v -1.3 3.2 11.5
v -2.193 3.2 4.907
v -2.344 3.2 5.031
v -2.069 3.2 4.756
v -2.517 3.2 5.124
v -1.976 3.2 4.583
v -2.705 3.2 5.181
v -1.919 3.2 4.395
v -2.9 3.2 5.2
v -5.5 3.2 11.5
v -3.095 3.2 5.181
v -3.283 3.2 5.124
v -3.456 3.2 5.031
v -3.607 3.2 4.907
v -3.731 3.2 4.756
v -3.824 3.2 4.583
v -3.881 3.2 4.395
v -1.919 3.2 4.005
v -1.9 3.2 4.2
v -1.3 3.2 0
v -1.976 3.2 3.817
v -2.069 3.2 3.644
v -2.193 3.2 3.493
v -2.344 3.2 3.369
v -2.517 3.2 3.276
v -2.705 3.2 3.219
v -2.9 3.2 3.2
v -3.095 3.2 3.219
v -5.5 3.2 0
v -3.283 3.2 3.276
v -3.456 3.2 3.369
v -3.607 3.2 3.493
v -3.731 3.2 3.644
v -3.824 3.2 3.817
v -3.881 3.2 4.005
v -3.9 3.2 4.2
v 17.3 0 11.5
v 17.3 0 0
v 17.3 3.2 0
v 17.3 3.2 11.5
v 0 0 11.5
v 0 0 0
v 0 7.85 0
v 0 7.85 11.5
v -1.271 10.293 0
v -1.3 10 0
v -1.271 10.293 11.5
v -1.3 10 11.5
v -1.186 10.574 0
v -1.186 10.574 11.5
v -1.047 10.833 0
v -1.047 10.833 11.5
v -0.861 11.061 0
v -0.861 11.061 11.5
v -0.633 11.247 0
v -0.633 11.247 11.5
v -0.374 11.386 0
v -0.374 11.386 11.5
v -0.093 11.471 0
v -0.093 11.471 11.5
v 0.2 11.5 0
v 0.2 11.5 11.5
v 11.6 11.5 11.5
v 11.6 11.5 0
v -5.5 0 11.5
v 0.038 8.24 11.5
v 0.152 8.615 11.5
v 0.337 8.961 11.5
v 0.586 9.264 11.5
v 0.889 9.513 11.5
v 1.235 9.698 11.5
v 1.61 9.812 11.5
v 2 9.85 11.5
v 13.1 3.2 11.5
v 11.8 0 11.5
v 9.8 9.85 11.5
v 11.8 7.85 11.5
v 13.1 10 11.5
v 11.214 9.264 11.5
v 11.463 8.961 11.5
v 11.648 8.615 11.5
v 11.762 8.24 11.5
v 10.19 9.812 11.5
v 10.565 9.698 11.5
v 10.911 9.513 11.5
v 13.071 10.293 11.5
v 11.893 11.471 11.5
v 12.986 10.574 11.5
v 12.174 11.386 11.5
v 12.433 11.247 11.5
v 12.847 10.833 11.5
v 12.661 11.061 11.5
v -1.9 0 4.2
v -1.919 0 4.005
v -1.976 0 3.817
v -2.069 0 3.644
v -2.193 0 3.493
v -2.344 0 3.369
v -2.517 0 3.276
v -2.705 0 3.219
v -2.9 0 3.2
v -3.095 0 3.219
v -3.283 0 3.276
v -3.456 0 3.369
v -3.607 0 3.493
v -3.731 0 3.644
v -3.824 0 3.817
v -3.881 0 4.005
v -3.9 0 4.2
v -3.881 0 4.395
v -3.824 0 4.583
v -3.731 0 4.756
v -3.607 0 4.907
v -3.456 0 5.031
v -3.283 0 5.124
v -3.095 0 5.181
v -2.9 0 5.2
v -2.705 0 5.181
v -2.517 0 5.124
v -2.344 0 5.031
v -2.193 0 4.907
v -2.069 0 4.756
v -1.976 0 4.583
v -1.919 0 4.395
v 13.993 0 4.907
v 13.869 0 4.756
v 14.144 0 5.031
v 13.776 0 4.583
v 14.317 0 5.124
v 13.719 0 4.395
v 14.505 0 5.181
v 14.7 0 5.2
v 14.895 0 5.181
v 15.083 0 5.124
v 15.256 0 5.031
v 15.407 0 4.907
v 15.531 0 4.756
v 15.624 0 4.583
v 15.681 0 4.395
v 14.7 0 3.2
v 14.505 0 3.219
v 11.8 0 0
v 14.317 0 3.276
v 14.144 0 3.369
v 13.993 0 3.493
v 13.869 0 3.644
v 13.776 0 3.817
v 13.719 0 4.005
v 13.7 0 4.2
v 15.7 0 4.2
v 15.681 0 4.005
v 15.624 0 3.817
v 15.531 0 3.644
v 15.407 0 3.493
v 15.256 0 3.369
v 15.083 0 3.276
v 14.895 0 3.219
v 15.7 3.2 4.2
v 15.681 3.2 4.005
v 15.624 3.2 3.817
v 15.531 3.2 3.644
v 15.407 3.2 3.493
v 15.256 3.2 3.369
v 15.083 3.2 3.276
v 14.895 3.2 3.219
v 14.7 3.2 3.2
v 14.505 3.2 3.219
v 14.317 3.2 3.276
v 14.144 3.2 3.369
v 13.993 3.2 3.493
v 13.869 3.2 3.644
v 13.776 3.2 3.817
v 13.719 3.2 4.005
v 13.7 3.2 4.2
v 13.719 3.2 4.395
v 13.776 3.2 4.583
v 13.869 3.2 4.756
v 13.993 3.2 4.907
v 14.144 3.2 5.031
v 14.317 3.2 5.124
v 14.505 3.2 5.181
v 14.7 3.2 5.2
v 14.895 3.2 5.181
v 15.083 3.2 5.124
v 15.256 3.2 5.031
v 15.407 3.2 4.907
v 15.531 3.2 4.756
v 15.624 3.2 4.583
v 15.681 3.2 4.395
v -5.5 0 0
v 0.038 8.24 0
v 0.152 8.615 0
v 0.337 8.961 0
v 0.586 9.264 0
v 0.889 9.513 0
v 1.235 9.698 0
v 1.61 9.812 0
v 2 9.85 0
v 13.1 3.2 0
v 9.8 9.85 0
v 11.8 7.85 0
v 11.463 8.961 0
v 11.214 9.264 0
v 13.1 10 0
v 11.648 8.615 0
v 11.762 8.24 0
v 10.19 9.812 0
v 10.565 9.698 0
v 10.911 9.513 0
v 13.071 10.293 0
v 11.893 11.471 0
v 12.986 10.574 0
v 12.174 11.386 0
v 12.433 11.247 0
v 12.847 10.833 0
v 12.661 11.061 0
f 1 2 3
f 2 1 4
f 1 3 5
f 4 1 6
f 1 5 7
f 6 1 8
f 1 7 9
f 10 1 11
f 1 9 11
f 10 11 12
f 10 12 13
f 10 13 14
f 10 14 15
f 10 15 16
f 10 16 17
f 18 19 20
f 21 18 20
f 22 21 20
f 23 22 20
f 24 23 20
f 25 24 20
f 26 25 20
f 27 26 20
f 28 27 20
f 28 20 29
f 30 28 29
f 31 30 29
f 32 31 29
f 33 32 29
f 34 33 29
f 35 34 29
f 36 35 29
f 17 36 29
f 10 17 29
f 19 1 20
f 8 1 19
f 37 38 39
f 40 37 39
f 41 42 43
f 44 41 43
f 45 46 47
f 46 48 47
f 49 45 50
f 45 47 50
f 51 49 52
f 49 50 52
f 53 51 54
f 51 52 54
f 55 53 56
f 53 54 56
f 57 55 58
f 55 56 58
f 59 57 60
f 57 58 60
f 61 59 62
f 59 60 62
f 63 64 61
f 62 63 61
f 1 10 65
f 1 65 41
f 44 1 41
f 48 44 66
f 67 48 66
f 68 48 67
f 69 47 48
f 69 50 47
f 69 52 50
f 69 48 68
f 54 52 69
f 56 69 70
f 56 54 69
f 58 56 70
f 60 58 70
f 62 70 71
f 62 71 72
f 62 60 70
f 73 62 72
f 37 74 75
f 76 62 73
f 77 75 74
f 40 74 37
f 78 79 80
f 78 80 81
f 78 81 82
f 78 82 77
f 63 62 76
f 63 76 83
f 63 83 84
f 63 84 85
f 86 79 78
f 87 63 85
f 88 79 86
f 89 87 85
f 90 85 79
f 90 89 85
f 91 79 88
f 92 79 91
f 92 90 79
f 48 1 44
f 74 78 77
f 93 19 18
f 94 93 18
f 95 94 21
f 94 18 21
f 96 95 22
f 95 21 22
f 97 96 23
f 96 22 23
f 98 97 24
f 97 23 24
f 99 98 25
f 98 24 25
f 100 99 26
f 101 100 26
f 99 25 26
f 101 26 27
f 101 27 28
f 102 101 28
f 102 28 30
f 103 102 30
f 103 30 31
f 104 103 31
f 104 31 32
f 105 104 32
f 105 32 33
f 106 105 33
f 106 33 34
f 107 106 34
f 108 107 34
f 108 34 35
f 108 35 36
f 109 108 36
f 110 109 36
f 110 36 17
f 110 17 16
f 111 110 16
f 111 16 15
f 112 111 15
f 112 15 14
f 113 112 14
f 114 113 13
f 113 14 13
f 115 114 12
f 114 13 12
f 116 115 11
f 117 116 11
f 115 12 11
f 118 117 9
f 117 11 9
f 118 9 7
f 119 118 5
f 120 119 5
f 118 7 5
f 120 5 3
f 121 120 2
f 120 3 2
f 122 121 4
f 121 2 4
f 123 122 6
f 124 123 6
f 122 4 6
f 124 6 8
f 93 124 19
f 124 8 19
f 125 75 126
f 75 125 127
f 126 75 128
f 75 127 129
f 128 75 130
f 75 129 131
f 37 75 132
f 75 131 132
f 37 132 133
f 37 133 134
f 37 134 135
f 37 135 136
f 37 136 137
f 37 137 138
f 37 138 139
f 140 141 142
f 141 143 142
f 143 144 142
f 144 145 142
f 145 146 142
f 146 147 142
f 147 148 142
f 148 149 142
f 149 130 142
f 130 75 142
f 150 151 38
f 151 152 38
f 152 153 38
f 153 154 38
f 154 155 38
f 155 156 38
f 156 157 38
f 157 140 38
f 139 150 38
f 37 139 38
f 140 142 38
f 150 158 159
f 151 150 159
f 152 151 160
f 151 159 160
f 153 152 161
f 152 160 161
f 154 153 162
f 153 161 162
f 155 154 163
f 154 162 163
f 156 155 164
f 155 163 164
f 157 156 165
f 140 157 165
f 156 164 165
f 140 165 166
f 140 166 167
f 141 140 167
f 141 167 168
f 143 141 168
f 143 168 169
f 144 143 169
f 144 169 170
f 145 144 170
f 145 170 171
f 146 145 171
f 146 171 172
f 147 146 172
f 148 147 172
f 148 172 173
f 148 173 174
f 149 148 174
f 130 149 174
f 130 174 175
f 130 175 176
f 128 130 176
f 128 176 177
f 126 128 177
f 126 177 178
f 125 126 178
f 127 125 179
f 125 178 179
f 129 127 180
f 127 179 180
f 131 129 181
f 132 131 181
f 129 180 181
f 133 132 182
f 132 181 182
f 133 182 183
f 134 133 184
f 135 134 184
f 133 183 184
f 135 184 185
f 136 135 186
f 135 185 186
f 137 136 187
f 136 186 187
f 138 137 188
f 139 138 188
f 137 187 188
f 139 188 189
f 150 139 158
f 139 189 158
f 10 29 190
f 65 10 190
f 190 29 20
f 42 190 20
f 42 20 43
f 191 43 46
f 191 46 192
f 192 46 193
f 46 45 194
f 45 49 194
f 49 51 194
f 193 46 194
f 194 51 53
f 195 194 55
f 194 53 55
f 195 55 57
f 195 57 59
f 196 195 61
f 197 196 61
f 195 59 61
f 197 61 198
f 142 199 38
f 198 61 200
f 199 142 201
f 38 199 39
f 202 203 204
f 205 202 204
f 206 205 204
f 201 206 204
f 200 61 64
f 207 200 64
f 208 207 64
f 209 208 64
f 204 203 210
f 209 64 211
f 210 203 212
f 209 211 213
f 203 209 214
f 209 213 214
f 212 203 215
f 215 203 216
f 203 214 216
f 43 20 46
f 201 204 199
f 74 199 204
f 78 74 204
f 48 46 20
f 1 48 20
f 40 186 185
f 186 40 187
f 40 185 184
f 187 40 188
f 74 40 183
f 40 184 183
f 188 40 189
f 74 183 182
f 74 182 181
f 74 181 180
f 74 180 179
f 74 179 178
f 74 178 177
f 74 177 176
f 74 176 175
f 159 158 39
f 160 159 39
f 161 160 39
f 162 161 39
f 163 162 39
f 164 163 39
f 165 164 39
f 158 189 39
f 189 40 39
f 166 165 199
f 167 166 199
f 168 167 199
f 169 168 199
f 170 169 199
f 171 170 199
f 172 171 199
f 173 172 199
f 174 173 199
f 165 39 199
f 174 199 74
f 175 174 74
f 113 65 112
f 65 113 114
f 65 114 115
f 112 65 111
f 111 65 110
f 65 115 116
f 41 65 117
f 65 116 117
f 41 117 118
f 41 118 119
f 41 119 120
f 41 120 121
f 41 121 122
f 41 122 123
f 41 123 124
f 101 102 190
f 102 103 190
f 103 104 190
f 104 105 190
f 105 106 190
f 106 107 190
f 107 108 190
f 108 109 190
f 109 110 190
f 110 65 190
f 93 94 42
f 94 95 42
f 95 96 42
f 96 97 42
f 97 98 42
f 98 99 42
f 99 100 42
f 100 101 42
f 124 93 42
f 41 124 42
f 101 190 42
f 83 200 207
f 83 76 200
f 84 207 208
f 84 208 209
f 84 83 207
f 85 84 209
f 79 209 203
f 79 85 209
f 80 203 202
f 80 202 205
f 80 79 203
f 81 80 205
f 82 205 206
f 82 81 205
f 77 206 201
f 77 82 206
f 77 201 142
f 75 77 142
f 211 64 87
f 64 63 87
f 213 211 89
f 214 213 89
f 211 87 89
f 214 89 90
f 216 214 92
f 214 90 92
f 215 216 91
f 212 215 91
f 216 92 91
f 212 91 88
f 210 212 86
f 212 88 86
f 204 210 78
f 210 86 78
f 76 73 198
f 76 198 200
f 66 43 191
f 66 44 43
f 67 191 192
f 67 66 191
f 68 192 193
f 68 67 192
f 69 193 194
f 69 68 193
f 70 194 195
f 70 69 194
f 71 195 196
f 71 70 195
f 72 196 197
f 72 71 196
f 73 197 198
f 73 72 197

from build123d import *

# Parameters (mm, degrees)
EXTRUDE_1_DEPTH     = 11.5
FILLET_1_R          = 2
FILLET_2_R          = 1.5
SKETCH_2_R          = 1
CUT_EXTRUDE_1_DEPTH = 11.5


with BuildPart() as part:
    # 草图1 → 凸台-拉伸1 (new body)
    with BuildSketch(Plane.XY):
        Polygon((0, 0), (0, 9.85), (11.8, 9.85), (11.8, 0), (17.3, 0), (17.3, 3.2), (13.1, 3.2), (13.1, 11.5), (-1.3, 11.5), (-1.3, 3.2), (-5.5, 3.2), (-5.5, 0), align=None)
    extrude(amount=EXTRUDE_1_DEPTH)

    # 圆角1
    fillet_1_edges = [part.edges().sort_by_distance(p)[0] for p in [
        (11.8, 9.85, 5.75),
        (0, 9.85, 5.75),
    ]]
    fillet(fillet_1_edges, radius=FILLET_1_R)

    # 圆角2
    fillet_2_edges = [part.edges().sort_by_distance(p)[0] for p in [
        (-1.3, 11.5, 5.75),
        (13.1, 11.5, 5.75),
    ]]
    fillet(fillet_2_edges, radius=FILLET_2_R)

    # 草图2 → 切除-拉伸1 (cut)
    with BuildSketch(Plane(origin=(0, 3.2, 0), x_dir=(1, 0, 0), z_dir=(0, 1, 0))):
        with Locations((-2.9, -4.2)):
            Circle(SKETCH_2_R)
        with Locations((14.7, -4.2)):
            Circle(SKETCH_2_R)
    extrude(amount=-CUT_EXTRUDE_1_DEPTH, mode=Mode.SUBTRACT)


solid = part.part
